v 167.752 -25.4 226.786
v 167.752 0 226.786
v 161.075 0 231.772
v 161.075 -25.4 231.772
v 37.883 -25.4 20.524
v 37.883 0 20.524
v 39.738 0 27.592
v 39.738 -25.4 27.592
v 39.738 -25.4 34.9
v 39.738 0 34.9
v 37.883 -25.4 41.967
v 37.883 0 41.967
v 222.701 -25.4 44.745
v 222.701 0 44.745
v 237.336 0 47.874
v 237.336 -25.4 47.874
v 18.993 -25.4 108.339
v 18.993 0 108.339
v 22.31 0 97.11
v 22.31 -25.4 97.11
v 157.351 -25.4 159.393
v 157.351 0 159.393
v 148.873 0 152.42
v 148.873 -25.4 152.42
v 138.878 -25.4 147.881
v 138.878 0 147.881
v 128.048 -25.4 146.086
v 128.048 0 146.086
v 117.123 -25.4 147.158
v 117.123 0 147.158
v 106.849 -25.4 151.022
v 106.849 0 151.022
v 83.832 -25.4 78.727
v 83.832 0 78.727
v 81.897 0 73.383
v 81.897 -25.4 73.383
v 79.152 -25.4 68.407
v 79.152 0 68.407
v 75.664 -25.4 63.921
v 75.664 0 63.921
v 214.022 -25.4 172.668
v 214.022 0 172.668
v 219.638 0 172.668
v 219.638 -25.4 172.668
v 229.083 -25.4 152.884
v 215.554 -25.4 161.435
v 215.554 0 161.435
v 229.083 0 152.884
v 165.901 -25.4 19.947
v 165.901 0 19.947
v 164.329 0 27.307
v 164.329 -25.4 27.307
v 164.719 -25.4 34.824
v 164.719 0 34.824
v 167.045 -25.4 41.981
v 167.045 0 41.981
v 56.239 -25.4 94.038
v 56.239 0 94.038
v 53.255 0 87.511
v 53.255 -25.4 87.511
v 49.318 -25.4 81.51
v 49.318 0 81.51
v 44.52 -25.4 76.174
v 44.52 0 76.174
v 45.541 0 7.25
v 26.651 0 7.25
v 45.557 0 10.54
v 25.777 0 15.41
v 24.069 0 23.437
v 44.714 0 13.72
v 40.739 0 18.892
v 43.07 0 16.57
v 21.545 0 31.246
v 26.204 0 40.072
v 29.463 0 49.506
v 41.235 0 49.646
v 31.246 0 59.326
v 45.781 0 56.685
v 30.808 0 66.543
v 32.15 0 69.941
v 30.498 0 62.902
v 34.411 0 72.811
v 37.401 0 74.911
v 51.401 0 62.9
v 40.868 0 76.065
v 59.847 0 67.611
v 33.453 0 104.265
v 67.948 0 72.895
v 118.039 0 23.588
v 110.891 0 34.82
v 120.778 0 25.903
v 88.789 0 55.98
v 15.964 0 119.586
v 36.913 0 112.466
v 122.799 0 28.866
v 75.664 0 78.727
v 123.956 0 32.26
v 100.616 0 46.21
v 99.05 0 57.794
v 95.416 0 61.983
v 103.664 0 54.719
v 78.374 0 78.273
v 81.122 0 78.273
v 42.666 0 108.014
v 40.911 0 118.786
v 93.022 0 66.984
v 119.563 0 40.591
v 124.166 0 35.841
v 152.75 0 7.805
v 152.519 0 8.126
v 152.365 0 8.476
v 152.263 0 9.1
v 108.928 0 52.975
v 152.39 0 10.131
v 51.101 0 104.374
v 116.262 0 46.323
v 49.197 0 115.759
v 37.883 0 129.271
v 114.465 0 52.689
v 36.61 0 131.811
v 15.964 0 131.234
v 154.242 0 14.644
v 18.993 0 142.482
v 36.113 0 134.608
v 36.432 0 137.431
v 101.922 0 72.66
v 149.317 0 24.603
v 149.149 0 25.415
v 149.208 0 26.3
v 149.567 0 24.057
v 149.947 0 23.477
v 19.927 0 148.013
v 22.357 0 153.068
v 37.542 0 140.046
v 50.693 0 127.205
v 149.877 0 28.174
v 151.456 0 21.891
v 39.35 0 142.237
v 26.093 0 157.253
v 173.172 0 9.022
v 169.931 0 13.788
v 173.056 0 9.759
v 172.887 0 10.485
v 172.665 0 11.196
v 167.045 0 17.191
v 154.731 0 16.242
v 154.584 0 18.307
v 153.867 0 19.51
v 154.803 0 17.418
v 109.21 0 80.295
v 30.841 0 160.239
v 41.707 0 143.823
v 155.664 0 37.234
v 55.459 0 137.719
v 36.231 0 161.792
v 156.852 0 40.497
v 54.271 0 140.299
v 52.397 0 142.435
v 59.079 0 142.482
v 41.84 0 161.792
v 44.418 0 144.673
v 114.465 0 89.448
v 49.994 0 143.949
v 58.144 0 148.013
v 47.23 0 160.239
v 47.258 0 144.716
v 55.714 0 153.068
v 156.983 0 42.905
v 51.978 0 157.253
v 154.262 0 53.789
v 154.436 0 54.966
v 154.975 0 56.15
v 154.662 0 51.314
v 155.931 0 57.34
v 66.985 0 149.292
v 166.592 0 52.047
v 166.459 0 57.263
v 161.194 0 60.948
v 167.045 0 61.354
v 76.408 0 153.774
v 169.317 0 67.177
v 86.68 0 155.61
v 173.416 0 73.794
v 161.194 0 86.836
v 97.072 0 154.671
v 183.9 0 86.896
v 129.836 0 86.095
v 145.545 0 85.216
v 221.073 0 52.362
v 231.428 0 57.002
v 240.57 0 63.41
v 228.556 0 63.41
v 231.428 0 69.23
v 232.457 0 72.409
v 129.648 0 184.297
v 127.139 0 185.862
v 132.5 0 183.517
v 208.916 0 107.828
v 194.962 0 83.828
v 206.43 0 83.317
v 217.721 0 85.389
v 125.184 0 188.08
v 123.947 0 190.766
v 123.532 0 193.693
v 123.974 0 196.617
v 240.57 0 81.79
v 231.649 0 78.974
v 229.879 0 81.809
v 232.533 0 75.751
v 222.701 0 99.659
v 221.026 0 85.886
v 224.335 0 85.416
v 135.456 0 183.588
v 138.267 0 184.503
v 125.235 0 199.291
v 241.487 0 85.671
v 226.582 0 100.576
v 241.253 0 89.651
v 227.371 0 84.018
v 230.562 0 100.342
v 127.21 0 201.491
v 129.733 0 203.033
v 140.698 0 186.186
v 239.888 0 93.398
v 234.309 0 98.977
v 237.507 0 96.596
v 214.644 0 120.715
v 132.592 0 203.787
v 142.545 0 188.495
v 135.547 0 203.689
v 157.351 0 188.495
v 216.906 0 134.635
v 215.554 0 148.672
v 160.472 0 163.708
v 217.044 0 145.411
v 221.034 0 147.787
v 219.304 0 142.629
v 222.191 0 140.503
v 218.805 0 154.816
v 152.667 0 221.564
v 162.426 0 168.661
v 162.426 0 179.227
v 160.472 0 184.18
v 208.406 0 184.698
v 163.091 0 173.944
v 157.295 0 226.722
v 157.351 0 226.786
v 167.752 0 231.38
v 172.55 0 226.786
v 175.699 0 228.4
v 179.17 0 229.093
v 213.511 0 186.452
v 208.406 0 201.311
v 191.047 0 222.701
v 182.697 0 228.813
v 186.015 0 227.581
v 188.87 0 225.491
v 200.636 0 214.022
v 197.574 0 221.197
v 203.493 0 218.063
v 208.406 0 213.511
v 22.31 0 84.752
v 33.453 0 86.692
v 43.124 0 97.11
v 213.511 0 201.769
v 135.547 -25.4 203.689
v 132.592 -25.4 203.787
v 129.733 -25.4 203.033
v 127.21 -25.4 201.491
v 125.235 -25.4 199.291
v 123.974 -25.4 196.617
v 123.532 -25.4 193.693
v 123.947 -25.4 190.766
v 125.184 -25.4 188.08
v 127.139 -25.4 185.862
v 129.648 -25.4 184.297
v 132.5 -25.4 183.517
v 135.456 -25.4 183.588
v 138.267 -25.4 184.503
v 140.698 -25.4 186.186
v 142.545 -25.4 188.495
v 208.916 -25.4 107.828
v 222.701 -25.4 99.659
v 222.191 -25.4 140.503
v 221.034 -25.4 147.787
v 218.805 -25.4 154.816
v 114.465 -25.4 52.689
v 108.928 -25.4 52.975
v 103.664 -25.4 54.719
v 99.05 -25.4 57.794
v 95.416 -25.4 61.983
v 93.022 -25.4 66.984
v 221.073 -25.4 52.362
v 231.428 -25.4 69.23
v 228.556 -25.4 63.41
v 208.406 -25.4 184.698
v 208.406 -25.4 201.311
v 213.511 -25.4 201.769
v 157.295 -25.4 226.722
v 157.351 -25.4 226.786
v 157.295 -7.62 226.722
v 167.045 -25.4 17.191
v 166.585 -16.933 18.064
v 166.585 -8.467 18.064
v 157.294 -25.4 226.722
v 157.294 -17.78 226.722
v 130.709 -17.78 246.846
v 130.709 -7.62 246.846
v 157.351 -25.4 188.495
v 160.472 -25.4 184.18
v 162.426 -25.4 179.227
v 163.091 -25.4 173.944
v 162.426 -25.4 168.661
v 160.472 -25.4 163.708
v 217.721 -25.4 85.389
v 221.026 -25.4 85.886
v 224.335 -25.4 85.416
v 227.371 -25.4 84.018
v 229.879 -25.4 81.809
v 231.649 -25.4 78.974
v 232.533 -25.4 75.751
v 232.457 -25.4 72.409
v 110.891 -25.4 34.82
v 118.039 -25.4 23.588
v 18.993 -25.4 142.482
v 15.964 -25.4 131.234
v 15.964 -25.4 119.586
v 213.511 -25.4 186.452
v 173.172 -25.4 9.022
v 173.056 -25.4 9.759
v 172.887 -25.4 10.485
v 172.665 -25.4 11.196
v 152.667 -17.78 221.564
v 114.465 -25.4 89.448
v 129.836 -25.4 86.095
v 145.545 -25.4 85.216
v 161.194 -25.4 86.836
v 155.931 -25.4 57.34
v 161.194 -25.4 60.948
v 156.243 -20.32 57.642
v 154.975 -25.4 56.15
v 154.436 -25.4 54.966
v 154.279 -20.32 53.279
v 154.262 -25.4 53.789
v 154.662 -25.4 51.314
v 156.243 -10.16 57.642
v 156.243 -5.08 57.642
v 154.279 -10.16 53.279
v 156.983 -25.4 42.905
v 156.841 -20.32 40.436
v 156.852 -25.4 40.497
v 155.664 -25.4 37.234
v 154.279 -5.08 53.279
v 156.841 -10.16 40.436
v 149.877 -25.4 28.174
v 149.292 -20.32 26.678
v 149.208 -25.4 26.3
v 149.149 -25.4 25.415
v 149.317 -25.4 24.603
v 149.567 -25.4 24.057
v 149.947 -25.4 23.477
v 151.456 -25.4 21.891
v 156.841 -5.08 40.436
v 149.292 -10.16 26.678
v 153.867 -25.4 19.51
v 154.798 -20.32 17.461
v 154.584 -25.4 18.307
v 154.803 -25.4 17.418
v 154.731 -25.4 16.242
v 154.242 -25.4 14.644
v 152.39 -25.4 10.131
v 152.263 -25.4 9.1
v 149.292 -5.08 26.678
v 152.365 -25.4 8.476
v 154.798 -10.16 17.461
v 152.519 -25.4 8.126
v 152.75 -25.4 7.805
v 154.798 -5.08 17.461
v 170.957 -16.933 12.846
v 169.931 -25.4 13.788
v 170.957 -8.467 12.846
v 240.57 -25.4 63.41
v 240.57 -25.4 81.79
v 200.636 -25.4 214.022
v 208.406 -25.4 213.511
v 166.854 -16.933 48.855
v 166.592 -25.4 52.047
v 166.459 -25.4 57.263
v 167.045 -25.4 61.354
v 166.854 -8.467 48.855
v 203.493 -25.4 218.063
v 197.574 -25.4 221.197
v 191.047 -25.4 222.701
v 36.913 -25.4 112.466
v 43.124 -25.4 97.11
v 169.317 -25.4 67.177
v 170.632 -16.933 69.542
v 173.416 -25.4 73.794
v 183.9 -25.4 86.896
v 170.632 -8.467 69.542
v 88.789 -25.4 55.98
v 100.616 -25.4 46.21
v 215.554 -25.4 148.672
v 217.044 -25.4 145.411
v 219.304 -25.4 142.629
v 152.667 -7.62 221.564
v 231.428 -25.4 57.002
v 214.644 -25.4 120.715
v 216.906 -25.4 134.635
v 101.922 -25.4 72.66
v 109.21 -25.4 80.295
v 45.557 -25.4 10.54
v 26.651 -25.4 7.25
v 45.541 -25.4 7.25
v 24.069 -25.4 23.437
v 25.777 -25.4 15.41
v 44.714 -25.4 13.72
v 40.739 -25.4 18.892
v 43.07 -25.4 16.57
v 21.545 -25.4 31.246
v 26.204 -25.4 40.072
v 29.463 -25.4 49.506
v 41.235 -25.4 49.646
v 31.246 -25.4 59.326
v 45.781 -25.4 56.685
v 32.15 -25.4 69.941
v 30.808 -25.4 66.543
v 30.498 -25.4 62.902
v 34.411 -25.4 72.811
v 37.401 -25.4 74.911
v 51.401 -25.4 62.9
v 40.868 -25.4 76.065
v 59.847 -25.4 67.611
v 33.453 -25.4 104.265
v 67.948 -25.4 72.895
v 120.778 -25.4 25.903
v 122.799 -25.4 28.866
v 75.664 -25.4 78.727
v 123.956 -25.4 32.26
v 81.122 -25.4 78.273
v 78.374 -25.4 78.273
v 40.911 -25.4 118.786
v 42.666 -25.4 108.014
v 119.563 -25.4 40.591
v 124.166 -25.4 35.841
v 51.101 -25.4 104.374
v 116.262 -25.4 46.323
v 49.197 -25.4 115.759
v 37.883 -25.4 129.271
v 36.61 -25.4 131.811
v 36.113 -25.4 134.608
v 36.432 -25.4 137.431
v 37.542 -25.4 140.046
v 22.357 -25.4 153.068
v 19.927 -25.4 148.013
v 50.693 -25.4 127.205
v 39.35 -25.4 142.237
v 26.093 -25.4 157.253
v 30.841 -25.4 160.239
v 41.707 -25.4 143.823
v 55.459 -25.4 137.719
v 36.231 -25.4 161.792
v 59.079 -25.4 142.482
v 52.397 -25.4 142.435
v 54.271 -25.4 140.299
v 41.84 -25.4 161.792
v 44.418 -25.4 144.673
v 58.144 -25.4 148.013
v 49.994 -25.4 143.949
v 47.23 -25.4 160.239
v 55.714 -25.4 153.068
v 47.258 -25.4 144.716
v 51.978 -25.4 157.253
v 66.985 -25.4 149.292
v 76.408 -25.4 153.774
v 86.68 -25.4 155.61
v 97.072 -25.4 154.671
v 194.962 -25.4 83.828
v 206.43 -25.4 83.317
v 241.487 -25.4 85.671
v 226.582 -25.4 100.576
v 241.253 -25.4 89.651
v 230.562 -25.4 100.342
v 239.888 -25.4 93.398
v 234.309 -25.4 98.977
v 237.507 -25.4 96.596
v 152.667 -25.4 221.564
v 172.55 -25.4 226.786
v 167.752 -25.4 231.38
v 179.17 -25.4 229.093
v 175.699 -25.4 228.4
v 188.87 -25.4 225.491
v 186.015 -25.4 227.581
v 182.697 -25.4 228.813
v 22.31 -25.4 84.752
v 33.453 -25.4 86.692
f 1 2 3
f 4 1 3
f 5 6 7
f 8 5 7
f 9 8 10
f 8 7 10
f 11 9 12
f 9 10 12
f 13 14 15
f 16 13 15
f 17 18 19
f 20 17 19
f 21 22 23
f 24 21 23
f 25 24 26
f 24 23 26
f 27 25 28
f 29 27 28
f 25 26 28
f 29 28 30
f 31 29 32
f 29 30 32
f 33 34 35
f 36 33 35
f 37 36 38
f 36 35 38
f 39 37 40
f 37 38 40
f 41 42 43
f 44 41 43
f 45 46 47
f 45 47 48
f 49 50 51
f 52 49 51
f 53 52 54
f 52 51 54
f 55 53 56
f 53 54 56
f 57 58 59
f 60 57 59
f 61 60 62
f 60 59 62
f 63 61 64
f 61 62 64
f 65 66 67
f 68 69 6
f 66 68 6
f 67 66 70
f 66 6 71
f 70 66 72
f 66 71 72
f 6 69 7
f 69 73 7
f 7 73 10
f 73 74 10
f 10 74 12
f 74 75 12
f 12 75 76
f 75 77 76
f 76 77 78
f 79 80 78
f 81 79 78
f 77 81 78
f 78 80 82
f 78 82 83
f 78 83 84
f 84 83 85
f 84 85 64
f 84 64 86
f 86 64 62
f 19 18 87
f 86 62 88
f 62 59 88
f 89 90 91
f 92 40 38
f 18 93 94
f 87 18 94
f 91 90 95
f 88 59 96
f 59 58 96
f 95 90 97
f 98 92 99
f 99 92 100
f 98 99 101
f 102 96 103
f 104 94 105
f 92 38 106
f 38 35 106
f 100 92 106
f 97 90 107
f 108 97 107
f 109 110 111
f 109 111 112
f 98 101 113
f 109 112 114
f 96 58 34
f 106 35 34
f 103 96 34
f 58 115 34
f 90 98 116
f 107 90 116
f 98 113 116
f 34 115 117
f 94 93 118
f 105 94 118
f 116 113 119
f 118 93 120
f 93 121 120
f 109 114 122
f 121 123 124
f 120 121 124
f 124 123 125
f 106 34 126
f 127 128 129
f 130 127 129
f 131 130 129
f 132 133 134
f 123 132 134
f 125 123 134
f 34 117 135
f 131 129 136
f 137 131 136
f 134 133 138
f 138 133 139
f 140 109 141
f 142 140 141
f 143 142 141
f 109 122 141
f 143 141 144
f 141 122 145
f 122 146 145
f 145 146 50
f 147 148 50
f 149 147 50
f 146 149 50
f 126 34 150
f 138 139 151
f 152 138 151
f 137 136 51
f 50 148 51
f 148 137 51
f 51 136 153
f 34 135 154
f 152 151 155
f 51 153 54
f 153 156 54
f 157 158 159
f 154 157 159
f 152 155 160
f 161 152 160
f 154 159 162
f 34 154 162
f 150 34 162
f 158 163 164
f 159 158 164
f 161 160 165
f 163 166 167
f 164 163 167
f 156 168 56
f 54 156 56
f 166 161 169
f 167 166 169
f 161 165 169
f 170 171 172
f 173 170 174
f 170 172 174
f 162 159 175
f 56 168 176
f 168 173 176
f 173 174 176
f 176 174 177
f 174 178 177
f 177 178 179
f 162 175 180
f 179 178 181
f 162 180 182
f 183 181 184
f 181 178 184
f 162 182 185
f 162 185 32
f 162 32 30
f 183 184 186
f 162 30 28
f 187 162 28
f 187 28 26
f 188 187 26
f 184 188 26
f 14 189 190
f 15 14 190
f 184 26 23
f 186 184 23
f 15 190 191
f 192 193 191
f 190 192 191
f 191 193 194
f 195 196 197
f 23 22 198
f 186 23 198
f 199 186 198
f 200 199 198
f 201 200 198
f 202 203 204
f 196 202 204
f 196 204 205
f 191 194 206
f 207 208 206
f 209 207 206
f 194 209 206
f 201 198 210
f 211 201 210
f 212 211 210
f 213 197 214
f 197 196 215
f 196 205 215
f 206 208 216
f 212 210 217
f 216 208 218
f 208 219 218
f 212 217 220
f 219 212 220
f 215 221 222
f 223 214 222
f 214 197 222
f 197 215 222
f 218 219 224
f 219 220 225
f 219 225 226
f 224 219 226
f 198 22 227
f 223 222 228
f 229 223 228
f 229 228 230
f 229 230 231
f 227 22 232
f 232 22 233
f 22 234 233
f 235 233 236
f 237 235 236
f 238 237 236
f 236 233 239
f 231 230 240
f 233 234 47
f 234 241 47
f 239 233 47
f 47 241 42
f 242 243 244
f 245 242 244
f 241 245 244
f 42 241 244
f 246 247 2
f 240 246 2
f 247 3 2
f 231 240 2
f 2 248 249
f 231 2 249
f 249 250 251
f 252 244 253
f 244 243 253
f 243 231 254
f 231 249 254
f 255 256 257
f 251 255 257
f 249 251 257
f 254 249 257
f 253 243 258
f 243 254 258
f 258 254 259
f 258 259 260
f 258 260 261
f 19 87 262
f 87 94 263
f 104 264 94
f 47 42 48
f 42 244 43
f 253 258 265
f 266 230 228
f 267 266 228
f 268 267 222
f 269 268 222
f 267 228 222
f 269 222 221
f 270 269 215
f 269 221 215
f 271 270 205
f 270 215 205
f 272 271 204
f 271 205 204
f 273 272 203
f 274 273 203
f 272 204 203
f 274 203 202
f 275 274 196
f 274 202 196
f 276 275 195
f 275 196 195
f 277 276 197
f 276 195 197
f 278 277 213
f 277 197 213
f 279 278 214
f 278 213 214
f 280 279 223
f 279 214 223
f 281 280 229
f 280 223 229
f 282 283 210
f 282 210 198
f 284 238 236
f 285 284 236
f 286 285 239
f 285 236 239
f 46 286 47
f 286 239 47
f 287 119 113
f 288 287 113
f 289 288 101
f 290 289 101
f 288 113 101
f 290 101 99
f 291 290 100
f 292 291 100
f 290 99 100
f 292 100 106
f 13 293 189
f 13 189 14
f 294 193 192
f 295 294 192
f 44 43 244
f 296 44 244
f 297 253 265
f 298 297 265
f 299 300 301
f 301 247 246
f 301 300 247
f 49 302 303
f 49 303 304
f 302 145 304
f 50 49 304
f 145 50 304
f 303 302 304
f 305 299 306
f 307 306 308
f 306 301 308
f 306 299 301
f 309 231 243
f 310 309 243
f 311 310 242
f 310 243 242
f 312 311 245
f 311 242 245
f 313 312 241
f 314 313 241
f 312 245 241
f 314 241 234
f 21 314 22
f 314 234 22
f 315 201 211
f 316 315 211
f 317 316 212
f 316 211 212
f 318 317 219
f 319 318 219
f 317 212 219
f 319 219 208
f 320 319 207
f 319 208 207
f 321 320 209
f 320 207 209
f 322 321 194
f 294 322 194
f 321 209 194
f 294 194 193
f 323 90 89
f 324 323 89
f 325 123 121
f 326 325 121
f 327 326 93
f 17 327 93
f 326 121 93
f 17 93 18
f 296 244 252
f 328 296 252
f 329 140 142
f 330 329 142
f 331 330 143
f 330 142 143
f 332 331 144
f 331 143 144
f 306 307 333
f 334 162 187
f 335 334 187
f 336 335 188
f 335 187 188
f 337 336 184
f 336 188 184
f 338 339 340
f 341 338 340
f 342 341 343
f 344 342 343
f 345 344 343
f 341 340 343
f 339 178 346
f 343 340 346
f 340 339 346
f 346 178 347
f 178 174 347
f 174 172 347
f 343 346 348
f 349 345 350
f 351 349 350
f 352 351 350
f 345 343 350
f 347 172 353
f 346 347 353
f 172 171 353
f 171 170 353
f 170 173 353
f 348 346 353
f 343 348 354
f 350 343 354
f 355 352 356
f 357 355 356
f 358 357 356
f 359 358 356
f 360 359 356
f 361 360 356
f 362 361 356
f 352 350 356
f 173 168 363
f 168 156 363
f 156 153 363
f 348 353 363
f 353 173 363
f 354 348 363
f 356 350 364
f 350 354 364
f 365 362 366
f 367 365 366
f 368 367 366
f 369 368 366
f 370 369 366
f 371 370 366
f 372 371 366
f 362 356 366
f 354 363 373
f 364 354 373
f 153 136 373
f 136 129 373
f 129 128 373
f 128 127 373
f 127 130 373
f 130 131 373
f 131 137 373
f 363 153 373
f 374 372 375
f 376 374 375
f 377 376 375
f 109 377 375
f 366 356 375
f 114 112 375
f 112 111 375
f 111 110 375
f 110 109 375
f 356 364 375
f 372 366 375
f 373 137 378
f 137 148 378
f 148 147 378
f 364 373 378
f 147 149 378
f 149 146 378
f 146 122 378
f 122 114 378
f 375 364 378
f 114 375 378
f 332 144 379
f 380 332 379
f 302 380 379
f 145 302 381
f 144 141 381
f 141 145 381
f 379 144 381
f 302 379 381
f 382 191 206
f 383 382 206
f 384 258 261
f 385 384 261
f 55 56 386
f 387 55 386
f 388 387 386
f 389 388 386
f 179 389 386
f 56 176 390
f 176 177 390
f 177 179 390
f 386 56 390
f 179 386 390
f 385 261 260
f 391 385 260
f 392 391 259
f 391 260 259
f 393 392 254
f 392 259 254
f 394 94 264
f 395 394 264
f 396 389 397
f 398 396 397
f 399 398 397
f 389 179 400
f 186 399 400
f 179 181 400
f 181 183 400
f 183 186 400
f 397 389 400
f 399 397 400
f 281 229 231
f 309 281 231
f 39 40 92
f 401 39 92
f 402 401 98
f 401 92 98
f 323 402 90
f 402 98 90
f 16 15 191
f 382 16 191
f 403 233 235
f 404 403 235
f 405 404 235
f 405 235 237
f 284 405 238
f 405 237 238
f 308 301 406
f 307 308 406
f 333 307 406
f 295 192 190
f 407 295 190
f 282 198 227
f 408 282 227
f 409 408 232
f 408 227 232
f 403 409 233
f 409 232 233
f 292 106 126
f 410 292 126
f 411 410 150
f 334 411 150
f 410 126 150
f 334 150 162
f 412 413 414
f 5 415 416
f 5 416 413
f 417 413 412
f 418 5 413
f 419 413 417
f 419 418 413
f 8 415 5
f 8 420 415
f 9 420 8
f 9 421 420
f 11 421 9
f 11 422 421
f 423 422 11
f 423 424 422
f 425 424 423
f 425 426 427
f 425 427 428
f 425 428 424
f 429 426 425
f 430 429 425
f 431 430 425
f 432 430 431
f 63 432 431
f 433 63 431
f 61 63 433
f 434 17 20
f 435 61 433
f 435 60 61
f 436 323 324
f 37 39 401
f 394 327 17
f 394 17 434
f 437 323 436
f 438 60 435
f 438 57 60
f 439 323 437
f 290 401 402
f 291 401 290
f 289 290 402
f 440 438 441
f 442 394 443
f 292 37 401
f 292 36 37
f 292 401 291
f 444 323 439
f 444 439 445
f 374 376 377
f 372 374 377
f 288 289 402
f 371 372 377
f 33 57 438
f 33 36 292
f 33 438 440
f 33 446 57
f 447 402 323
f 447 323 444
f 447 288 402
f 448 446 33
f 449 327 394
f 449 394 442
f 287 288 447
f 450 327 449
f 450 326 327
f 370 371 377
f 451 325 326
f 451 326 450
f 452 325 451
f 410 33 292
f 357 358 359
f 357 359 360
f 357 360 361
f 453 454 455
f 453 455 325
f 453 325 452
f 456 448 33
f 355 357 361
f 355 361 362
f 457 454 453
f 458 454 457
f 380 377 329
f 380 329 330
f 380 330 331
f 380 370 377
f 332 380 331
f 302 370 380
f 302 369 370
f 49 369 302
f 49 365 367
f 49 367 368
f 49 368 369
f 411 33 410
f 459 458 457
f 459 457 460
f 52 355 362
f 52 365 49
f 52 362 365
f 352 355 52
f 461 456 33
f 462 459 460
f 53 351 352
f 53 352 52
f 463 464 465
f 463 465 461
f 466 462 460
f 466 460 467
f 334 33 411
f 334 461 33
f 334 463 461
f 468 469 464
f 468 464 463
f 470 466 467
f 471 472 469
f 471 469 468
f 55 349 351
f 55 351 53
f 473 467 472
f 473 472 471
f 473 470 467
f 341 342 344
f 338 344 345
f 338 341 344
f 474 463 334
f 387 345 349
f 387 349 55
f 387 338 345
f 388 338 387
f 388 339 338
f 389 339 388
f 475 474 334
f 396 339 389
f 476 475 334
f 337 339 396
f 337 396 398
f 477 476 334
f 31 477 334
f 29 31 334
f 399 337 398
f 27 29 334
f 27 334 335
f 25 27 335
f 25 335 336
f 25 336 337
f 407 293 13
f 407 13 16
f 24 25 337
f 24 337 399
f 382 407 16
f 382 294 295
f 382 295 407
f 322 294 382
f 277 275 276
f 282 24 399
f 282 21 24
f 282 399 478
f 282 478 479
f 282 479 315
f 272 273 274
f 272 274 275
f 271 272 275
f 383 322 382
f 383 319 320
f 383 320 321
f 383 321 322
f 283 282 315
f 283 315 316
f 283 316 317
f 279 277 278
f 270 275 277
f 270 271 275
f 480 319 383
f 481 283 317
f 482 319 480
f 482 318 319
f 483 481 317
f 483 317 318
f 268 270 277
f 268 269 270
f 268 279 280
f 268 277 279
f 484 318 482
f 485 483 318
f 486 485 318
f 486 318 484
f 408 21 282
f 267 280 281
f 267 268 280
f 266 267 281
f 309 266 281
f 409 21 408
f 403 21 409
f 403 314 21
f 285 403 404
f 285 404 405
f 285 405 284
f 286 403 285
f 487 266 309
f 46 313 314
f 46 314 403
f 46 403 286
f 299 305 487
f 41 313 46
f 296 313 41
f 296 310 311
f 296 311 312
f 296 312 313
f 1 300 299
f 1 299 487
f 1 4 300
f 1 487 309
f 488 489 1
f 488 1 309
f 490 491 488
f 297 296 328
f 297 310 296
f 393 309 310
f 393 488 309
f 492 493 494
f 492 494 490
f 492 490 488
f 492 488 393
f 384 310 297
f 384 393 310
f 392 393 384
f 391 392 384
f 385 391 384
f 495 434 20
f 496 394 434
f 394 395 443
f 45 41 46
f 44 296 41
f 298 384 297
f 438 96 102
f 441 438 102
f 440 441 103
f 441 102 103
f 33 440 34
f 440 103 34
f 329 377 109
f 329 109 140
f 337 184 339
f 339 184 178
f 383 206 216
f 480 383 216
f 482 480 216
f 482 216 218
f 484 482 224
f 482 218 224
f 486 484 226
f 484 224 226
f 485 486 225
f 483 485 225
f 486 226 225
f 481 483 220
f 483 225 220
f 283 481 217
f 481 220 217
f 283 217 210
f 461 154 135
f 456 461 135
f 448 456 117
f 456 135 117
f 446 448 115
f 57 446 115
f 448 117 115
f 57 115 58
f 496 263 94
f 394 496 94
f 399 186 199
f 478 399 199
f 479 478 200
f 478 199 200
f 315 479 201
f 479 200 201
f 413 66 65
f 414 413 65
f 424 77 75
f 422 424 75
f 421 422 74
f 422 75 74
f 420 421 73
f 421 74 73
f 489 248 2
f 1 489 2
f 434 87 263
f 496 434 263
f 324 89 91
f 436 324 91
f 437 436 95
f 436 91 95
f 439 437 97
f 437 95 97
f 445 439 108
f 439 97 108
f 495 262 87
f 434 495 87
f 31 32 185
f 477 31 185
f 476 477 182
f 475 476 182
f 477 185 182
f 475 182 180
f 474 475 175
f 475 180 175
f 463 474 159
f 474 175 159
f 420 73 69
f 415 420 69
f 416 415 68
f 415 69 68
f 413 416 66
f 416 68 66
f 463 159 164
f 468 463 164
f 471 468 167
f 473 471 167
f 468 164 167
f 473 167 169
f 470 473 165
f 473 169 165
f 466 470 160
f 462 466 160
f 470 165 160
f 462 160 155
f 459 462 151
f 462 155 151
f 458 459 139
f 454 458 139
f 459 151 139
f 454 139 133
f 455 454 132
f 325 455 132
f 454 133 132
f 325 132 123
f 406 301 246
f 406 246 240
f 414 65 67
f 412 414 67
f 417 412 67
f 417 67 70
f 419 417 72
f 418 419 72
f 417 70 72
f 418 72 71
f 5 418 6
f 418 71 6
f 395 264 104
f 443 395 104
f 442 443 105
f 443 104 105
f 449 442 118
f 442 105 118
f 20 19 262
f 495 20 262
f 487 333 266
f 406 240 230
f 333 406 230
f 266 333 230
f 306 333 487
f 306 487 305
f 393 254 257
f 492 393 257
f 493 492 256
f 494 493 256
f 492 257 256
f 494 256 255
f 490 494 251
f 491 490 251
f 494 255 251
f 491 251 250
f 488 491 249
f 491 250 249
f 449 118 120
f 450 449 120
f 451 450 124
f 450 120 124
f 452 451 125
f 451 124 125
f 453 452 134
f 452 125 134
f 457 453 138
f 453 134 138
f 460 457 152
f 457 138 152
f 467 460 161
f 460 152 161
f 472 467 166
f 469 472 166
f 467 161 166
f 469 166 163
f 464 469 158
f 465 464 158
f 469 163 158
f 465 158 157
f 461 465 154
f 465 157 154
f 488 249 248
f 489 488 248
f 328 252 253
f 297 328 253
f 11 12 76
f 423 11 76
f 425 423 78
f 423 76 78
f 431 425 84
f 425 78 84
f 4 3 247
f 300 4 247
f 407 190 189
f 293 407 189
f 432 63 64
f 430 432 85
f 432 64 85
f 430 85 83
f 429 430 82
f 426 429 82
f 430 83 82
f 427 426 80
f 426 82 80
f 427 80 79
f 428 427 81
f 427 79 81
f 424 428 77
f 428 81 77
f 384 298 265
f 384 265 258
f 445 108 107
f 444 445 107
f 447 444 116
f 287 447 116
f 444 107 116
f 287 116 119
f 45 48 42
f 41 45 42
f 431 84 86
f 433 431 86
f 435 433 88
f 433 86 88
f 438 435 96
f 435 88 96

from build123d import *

# Parameters (mm, degrees)
F1_DEPTH = 25.4
F3_DEPTH = 25.4
F5_DEPTH = 7.62
F7_DEPTH = 7.62


with BuildPart() as f1:
    # F0 (on Front) → F1 (new body)
    with BuildSketch(Plane.XZ):
        with BuildLine():
            ThreePointArc((55.4591871163, 137.7187907169), (57.1778936646, 140.1694279188), (59.0786326768, 142.4817354462))
            ThreePointArc((59.0786326768, 142.4817354462), (39.0356978447, 161.9894984881), (18.9927630126, 142.4817354462))
            ThreePointArc((18.9927630126, 142.4817354462), (15.5809128086, 125.4101537656), (18.9927630126, 108.3385720849))
            Line((18.9927630126, 108.3385720849), (22.309999913, 97.1100777388))
            Line((22.309999913, 97.1100777388), (22.309999913, 84.7518071532))
            Line((22.309999913, 84.7518071532), (33.4528027138, 104.264870286))
            Line((33.4528027138, 104.264870286), (33.4528027138, 86.6916491587))
            Line((33.4528027138, 86.6916491587), (36.9130928491, 112.466349486))
            Line((36.9130928491, 112.466349486), (43.123934418, 97.1100777388))
            ThreePointArc((43.123934418, 97.1100777388), (41.9493193566, 113.4261599819), (37.8830172122, 129.2710155249))
            ThreePointArc((37.8830172122, 129.2710155249), (41.7069327363, 143.8231946906), (55.4591871163, 137.7187907169))
        make_face()
        with BuildLine():
            Line((161.0753406305, 231.77226012), (157.3511064053, 226.7855703831))
            Line((157.3511064053, 226.7855703831), (153.2667279243, 222.1906334162))
            Line((153.2667279243, 222.1906334162), (135.5471188815, 203.6892712114))
            ThreePointArc((135.5471188815, 203.6892712114), (124.4679795229, 189.3777542773), (142.5452232361, 188.4945183992))
            Line((142.5452232361, 188.4945183992), (157.3511064053, 188.4945183992))
            ThreePointArc((157.3511064053, 188.4945183992), (163.0913283676, 173.9439144731), (157.3511064053, 159.3933105469))
            ThreePointArc((157.3511064053, 159.3933105469), (133.5218764448, 146.628732852), (106.8485764131, 151.0221039559))
            ThreePointArc((106.8485764131, 151.0221039559), (81.4826477265, 155.0355463169), (59.0786326768, 142.4817354462))
            ThreePointArc((59.0786326768, 142.4817354462), (57.1778936646, 140.1694279188), (55.4591871163, 137.7187907169))
            ThreePointArc((55.4591871163, 137.7187907169), (49.1972996165, 115.7594263547), (56.2388920861, 94.0375274104))
            ThreePointArc((56.2388920861, 94.0375274104), (51.4005357949, 84.435997918), (44.5201359689, 76.1740878224))
            ThreePointArc((44.5201359689, 76.1740878224), (33.1757105593, 71.4588467738), (31.2459021807, 59.3260265887))
            ThreePointArc((31.2459021807, 59.3260265887), (28.0144474885, 44.7267728634), (21.5454995632, 31.2459263951))
            ThreePointArc((21.5454995632, 31.2459263951), (25.0258299967, 19.4454210796), (26.6509782523, 7.2501958348))
            Line((26.6509782523, 7.2501958348), (45.5412305892, 7.2501958348))
            ThreePointArc((45.5412305892, 7.2501958348), (43.9865002742, 15.1994537749), (37.8830172122, 20.52443102))
            ThreePointArc((37.8830172122, 20.52443102), (39.9724122876, 31.2459263951), (37.8830172122, 41.9674217701))
            ThreePointArc((37.8830172122, 41.9674217701), (43.3657124777, 53.2576823746), (51.4005357949, 62.8998577595))
            ThreePointArc((51.4005357949, 62.8998577595), (63.9434482796, 70.1826306752), (75.6635218859, 78.7268280983))
            ThreePointArc((75.6635218859, 78.7268280983), (79.7479003668, 78.2162845135), (83.8322788477, 78.7268280983))
            ThreePointArc((83.8322788477, 78.7268280983), (80.62219761, 70.8415194676), (75.6635218859, 63.9209523797))
            ThreePointArc((75.6635218859, 63.9209523797), (94.8811032097, 51.3116760169), (110.8912838002, 34.8197567898))
            Line((110.8912838002, 34.8197567898), (118.0389523506, 23.5877130181))
            ThreePointArc((118.0389523506, 23.5877130181), (122.7991958663, 28.8657998516), (124.165520072, 35.8408465981))
            ThreePointArc((124.165520072, 35.8408465981), (117.7349645729, 43.3549786498), (114.4651249051, 52.6889152825))
            ThreePointArc((114.4651249051, 52.6889152825), (101.2536184714, 56.1015596962), (93.0221304297, 66.9842362404))
            ThreePointArc((93.0221304297, 66.9842362404), (105.7958752022, 76.2573128263), (114.4651249051, 89.4483178854))
            ThreePointArc((114.4651249051, 89.4483178854), (137.6729881459, 85.3431639936), (161.1937859731, 86.8362394266))
            Line((161.1937859731, 86.8362394266), (161.1937859731, 60.947837063))
            add(Edge.make_bspline(
                [(161.1937859731, 60.947837063), (157.8993693687, 59.0561358776), (150.6323180509, 54.8832909577), (162.2144334117, 39.9763215602), (143.2040633117, 24.6385665246), (159.3573781955, 18.7003155427), (150.8482458466, 9.9391907933), (152.7499995265, 7.8050355296)],
                knots=[0, 0, 0, 0, 0.0779334272, 0.1719109278, 0.2757758884, 0.3531240541, 0.4319815568, 0.4319815568, 0.4319815568, 0.4319815568], degree=3))
            Line((152.7499995265, 7.8050355296), (173.171891931, 9.0224858617))
            ThreePointArc((173.171891931, 9.0224858617), (172.9779809567, 10.1232568284), (172.664853356, 11.1962196856))
            add(Edge.make_bspline(
                [(172.664853356, 11.1962196856), (171.3313436819, 12.7085104711), (168.5824067748, 14.597468285), (167.0453242097, 17.1912484114)],
                knots=[0.5736467919, 0.5736467919, 0.5736467919, 0.5736467919, 0.6257117477, 0.6257117477, 0.6257117477, 0.6257117477], degree=3))
            add(Edge.make_bspline(
                [(167.0453242097, 17.1912484114), (166.5426299969, 18.0395296218), (166.169553332, 18.9631972351), (165.9011092746, 19.9468993754)],
                knots=[0.6257117477, 0.6257117477, 0.6257117477, 0.6257117477, 0.6427392989, 0.6427392989, 0.6427392989, 0.6427392989], degree=3))
            ThreePointArc((165.9011092746, 19.9468993754), (164.2768081704, 31.0782012829), (167.0453242097, 41.9813914203))
            add(Edge.make_bspline(
                [(167.0453242097, 41.9813914203), (167.3962963394, 49.2992780507), (165.4846355858, 55.0477309675), (167.0453242097, 61.3542387283)],
                knots=[0.7506807864, 0.7506807864, 0.7506807864, 0.7506807864, 0.8611546748, 0.8611546748, 0.8611546748, 0.8611546748], degree=3))
            add(Edge.make_bspline(
                [(167.0453242097, 61.3542387283), (169.0068222846, 69.2803571375), (176.4531944079, 78.0879710988), (183.8995665312, 86.8955850601)],
                knots=[0.8611546748, 0.8611546748, 0.8611546748, 0.8611546748, 1, 1, 1, 1], degree=3))
            ThreePointArc((183.8995665312, 86.8955850601), (200.6813055662, 83.248064902), (217.7208593273, 85.3892738977))
            ThreePointArc((217.7208593273, 85.3892738977), (229.8786920932, 81.8087152157), (231.4277632013, 69.2296183983))
            Line((231.4277632013, 69.2296183983), (228.5562352695, 63.4104087949))
            Line((228.5562352695, 63.4104087949), (231.4277632013, 57.001966241))
            Line((231.4277632013, 57.001966241), (221.0727564471, 52.3620415043))
            Line((221.0727564471, 52.3620415043), (222.7011620998, 44.7454368664))
            Line((222.7011620998, 44.7454368664), (237.3357014598, 47.8742544631))
            Line((237.3357014598, 47.8742544631), (240.5703216791, 63.4104087949))
            Line((240.5703216791, 63.4104087949), (240.5703216791, 81.790111959))
            ThreePointArc((240.5703216791, 81.790111959), (237.5070340931, 96.5959839523), (222.7011620998, 99.6592715383))
            Line((222.7011620998, 99.6592715383), (208.9163959026, 107.8280285001))
            ThreePointArc((208.9163959026, 107.8280285001), (216.2226754166, 127.6019199845), (215.5535072088, 148.6718207598))
            ThreePointArc((215.5535072088, 148.6718207598), (218.0854842896, 143.9483475476), (222.190618515, 140.503063798))
            ThreePointArc((222.190618515, 140.503063798), (220.0514151702, 151.3432226251), (215.5535072088, 161.4354997873))
            Line((215.5535072088, 161.4354997873), (229.0830209851, 152.8838410974))
            Line((229.0830209851, 152.8838410974), (214.0218615532, 172.6675480604))
            Line((214.0218615532, 172.6675480604), (219.6378856897, 172.6675480604))
            Line((219.6378856897, 172.6675480604), (208.4058374166, 184.6981031667))
            Line((208.4058374166, 184.6981031667), (213.5113179684, 186.4523291588))
            Line((213.5113179684, 186.4523291588), (208.4058374166, 201.3112651118))
            Line((208.4058374166, 201.3112651118), (213.5113179684, 201.7687410116))
            Line((213.5113179684, 201.7687410116), (200.6355195315, 214.0218764544))
            Line((200.6355195315, 214.0218764544), (208.4058374166, 213.5113328695))
            ThreePointArc((208.4058374166, 213.5113328695), (200.6355195315, 219.8232430535), (191.0472214222, 222.7011919022))
            ThreePointArc((191.0472214222, 222.7011919022), (182.6973201136, 228.8132361759), (172.5500786904, 226.7855703831))
            Line((172.5500786904, 226.7855703831), (167.7524379956, 231.3804924488))
            Line((167.7524379956, 231.3804924488), (167.7524379956, 226.7855703831))
            Line((167.7524379956, 226.7855703831), (161.0753406305, 231.77226012))
        make_face()
    extrude(amount=F1_DEPTH)

    # F2 (on Front) → F3 (join)
    with BuildSketch(Plane.XZ):
        Polygon((130.7088136673, 246.8455582857), (152.7369320393, 221.4836478233), (157.5240641832, 226.5485674143), align=None)
    extrude(amount=F3_DEPTH)

    # F4 (on face) → F5 (cut)
    with BuildSketch(Plane(origin=(0, 0, 0), x_dir=(-1, 0, 0), z_dir=(0, 1, 0))):
        Polygon((-157.2947343563, 226.7221516738), (-152.6668710263, 221.5643120502), (-130.7088136673, 246.8455582857), align=None)
    extrude(amount=-F5_DEPTH, mode=Mode.SUBTRACT)

    # F6 (on face) → F7 (cut)
    with BuildSketch(Plane.XZ.offset(25.4)):
        Polygon((130.7088136673, 246.8455582857), (152.6668710263, 221.5643120502), (157.2944223706, 226.7223878219), align=None)
    extrude(amount=-F7_DEPTH, mode=Mode.SUBTRACT)


solid = f1.part
